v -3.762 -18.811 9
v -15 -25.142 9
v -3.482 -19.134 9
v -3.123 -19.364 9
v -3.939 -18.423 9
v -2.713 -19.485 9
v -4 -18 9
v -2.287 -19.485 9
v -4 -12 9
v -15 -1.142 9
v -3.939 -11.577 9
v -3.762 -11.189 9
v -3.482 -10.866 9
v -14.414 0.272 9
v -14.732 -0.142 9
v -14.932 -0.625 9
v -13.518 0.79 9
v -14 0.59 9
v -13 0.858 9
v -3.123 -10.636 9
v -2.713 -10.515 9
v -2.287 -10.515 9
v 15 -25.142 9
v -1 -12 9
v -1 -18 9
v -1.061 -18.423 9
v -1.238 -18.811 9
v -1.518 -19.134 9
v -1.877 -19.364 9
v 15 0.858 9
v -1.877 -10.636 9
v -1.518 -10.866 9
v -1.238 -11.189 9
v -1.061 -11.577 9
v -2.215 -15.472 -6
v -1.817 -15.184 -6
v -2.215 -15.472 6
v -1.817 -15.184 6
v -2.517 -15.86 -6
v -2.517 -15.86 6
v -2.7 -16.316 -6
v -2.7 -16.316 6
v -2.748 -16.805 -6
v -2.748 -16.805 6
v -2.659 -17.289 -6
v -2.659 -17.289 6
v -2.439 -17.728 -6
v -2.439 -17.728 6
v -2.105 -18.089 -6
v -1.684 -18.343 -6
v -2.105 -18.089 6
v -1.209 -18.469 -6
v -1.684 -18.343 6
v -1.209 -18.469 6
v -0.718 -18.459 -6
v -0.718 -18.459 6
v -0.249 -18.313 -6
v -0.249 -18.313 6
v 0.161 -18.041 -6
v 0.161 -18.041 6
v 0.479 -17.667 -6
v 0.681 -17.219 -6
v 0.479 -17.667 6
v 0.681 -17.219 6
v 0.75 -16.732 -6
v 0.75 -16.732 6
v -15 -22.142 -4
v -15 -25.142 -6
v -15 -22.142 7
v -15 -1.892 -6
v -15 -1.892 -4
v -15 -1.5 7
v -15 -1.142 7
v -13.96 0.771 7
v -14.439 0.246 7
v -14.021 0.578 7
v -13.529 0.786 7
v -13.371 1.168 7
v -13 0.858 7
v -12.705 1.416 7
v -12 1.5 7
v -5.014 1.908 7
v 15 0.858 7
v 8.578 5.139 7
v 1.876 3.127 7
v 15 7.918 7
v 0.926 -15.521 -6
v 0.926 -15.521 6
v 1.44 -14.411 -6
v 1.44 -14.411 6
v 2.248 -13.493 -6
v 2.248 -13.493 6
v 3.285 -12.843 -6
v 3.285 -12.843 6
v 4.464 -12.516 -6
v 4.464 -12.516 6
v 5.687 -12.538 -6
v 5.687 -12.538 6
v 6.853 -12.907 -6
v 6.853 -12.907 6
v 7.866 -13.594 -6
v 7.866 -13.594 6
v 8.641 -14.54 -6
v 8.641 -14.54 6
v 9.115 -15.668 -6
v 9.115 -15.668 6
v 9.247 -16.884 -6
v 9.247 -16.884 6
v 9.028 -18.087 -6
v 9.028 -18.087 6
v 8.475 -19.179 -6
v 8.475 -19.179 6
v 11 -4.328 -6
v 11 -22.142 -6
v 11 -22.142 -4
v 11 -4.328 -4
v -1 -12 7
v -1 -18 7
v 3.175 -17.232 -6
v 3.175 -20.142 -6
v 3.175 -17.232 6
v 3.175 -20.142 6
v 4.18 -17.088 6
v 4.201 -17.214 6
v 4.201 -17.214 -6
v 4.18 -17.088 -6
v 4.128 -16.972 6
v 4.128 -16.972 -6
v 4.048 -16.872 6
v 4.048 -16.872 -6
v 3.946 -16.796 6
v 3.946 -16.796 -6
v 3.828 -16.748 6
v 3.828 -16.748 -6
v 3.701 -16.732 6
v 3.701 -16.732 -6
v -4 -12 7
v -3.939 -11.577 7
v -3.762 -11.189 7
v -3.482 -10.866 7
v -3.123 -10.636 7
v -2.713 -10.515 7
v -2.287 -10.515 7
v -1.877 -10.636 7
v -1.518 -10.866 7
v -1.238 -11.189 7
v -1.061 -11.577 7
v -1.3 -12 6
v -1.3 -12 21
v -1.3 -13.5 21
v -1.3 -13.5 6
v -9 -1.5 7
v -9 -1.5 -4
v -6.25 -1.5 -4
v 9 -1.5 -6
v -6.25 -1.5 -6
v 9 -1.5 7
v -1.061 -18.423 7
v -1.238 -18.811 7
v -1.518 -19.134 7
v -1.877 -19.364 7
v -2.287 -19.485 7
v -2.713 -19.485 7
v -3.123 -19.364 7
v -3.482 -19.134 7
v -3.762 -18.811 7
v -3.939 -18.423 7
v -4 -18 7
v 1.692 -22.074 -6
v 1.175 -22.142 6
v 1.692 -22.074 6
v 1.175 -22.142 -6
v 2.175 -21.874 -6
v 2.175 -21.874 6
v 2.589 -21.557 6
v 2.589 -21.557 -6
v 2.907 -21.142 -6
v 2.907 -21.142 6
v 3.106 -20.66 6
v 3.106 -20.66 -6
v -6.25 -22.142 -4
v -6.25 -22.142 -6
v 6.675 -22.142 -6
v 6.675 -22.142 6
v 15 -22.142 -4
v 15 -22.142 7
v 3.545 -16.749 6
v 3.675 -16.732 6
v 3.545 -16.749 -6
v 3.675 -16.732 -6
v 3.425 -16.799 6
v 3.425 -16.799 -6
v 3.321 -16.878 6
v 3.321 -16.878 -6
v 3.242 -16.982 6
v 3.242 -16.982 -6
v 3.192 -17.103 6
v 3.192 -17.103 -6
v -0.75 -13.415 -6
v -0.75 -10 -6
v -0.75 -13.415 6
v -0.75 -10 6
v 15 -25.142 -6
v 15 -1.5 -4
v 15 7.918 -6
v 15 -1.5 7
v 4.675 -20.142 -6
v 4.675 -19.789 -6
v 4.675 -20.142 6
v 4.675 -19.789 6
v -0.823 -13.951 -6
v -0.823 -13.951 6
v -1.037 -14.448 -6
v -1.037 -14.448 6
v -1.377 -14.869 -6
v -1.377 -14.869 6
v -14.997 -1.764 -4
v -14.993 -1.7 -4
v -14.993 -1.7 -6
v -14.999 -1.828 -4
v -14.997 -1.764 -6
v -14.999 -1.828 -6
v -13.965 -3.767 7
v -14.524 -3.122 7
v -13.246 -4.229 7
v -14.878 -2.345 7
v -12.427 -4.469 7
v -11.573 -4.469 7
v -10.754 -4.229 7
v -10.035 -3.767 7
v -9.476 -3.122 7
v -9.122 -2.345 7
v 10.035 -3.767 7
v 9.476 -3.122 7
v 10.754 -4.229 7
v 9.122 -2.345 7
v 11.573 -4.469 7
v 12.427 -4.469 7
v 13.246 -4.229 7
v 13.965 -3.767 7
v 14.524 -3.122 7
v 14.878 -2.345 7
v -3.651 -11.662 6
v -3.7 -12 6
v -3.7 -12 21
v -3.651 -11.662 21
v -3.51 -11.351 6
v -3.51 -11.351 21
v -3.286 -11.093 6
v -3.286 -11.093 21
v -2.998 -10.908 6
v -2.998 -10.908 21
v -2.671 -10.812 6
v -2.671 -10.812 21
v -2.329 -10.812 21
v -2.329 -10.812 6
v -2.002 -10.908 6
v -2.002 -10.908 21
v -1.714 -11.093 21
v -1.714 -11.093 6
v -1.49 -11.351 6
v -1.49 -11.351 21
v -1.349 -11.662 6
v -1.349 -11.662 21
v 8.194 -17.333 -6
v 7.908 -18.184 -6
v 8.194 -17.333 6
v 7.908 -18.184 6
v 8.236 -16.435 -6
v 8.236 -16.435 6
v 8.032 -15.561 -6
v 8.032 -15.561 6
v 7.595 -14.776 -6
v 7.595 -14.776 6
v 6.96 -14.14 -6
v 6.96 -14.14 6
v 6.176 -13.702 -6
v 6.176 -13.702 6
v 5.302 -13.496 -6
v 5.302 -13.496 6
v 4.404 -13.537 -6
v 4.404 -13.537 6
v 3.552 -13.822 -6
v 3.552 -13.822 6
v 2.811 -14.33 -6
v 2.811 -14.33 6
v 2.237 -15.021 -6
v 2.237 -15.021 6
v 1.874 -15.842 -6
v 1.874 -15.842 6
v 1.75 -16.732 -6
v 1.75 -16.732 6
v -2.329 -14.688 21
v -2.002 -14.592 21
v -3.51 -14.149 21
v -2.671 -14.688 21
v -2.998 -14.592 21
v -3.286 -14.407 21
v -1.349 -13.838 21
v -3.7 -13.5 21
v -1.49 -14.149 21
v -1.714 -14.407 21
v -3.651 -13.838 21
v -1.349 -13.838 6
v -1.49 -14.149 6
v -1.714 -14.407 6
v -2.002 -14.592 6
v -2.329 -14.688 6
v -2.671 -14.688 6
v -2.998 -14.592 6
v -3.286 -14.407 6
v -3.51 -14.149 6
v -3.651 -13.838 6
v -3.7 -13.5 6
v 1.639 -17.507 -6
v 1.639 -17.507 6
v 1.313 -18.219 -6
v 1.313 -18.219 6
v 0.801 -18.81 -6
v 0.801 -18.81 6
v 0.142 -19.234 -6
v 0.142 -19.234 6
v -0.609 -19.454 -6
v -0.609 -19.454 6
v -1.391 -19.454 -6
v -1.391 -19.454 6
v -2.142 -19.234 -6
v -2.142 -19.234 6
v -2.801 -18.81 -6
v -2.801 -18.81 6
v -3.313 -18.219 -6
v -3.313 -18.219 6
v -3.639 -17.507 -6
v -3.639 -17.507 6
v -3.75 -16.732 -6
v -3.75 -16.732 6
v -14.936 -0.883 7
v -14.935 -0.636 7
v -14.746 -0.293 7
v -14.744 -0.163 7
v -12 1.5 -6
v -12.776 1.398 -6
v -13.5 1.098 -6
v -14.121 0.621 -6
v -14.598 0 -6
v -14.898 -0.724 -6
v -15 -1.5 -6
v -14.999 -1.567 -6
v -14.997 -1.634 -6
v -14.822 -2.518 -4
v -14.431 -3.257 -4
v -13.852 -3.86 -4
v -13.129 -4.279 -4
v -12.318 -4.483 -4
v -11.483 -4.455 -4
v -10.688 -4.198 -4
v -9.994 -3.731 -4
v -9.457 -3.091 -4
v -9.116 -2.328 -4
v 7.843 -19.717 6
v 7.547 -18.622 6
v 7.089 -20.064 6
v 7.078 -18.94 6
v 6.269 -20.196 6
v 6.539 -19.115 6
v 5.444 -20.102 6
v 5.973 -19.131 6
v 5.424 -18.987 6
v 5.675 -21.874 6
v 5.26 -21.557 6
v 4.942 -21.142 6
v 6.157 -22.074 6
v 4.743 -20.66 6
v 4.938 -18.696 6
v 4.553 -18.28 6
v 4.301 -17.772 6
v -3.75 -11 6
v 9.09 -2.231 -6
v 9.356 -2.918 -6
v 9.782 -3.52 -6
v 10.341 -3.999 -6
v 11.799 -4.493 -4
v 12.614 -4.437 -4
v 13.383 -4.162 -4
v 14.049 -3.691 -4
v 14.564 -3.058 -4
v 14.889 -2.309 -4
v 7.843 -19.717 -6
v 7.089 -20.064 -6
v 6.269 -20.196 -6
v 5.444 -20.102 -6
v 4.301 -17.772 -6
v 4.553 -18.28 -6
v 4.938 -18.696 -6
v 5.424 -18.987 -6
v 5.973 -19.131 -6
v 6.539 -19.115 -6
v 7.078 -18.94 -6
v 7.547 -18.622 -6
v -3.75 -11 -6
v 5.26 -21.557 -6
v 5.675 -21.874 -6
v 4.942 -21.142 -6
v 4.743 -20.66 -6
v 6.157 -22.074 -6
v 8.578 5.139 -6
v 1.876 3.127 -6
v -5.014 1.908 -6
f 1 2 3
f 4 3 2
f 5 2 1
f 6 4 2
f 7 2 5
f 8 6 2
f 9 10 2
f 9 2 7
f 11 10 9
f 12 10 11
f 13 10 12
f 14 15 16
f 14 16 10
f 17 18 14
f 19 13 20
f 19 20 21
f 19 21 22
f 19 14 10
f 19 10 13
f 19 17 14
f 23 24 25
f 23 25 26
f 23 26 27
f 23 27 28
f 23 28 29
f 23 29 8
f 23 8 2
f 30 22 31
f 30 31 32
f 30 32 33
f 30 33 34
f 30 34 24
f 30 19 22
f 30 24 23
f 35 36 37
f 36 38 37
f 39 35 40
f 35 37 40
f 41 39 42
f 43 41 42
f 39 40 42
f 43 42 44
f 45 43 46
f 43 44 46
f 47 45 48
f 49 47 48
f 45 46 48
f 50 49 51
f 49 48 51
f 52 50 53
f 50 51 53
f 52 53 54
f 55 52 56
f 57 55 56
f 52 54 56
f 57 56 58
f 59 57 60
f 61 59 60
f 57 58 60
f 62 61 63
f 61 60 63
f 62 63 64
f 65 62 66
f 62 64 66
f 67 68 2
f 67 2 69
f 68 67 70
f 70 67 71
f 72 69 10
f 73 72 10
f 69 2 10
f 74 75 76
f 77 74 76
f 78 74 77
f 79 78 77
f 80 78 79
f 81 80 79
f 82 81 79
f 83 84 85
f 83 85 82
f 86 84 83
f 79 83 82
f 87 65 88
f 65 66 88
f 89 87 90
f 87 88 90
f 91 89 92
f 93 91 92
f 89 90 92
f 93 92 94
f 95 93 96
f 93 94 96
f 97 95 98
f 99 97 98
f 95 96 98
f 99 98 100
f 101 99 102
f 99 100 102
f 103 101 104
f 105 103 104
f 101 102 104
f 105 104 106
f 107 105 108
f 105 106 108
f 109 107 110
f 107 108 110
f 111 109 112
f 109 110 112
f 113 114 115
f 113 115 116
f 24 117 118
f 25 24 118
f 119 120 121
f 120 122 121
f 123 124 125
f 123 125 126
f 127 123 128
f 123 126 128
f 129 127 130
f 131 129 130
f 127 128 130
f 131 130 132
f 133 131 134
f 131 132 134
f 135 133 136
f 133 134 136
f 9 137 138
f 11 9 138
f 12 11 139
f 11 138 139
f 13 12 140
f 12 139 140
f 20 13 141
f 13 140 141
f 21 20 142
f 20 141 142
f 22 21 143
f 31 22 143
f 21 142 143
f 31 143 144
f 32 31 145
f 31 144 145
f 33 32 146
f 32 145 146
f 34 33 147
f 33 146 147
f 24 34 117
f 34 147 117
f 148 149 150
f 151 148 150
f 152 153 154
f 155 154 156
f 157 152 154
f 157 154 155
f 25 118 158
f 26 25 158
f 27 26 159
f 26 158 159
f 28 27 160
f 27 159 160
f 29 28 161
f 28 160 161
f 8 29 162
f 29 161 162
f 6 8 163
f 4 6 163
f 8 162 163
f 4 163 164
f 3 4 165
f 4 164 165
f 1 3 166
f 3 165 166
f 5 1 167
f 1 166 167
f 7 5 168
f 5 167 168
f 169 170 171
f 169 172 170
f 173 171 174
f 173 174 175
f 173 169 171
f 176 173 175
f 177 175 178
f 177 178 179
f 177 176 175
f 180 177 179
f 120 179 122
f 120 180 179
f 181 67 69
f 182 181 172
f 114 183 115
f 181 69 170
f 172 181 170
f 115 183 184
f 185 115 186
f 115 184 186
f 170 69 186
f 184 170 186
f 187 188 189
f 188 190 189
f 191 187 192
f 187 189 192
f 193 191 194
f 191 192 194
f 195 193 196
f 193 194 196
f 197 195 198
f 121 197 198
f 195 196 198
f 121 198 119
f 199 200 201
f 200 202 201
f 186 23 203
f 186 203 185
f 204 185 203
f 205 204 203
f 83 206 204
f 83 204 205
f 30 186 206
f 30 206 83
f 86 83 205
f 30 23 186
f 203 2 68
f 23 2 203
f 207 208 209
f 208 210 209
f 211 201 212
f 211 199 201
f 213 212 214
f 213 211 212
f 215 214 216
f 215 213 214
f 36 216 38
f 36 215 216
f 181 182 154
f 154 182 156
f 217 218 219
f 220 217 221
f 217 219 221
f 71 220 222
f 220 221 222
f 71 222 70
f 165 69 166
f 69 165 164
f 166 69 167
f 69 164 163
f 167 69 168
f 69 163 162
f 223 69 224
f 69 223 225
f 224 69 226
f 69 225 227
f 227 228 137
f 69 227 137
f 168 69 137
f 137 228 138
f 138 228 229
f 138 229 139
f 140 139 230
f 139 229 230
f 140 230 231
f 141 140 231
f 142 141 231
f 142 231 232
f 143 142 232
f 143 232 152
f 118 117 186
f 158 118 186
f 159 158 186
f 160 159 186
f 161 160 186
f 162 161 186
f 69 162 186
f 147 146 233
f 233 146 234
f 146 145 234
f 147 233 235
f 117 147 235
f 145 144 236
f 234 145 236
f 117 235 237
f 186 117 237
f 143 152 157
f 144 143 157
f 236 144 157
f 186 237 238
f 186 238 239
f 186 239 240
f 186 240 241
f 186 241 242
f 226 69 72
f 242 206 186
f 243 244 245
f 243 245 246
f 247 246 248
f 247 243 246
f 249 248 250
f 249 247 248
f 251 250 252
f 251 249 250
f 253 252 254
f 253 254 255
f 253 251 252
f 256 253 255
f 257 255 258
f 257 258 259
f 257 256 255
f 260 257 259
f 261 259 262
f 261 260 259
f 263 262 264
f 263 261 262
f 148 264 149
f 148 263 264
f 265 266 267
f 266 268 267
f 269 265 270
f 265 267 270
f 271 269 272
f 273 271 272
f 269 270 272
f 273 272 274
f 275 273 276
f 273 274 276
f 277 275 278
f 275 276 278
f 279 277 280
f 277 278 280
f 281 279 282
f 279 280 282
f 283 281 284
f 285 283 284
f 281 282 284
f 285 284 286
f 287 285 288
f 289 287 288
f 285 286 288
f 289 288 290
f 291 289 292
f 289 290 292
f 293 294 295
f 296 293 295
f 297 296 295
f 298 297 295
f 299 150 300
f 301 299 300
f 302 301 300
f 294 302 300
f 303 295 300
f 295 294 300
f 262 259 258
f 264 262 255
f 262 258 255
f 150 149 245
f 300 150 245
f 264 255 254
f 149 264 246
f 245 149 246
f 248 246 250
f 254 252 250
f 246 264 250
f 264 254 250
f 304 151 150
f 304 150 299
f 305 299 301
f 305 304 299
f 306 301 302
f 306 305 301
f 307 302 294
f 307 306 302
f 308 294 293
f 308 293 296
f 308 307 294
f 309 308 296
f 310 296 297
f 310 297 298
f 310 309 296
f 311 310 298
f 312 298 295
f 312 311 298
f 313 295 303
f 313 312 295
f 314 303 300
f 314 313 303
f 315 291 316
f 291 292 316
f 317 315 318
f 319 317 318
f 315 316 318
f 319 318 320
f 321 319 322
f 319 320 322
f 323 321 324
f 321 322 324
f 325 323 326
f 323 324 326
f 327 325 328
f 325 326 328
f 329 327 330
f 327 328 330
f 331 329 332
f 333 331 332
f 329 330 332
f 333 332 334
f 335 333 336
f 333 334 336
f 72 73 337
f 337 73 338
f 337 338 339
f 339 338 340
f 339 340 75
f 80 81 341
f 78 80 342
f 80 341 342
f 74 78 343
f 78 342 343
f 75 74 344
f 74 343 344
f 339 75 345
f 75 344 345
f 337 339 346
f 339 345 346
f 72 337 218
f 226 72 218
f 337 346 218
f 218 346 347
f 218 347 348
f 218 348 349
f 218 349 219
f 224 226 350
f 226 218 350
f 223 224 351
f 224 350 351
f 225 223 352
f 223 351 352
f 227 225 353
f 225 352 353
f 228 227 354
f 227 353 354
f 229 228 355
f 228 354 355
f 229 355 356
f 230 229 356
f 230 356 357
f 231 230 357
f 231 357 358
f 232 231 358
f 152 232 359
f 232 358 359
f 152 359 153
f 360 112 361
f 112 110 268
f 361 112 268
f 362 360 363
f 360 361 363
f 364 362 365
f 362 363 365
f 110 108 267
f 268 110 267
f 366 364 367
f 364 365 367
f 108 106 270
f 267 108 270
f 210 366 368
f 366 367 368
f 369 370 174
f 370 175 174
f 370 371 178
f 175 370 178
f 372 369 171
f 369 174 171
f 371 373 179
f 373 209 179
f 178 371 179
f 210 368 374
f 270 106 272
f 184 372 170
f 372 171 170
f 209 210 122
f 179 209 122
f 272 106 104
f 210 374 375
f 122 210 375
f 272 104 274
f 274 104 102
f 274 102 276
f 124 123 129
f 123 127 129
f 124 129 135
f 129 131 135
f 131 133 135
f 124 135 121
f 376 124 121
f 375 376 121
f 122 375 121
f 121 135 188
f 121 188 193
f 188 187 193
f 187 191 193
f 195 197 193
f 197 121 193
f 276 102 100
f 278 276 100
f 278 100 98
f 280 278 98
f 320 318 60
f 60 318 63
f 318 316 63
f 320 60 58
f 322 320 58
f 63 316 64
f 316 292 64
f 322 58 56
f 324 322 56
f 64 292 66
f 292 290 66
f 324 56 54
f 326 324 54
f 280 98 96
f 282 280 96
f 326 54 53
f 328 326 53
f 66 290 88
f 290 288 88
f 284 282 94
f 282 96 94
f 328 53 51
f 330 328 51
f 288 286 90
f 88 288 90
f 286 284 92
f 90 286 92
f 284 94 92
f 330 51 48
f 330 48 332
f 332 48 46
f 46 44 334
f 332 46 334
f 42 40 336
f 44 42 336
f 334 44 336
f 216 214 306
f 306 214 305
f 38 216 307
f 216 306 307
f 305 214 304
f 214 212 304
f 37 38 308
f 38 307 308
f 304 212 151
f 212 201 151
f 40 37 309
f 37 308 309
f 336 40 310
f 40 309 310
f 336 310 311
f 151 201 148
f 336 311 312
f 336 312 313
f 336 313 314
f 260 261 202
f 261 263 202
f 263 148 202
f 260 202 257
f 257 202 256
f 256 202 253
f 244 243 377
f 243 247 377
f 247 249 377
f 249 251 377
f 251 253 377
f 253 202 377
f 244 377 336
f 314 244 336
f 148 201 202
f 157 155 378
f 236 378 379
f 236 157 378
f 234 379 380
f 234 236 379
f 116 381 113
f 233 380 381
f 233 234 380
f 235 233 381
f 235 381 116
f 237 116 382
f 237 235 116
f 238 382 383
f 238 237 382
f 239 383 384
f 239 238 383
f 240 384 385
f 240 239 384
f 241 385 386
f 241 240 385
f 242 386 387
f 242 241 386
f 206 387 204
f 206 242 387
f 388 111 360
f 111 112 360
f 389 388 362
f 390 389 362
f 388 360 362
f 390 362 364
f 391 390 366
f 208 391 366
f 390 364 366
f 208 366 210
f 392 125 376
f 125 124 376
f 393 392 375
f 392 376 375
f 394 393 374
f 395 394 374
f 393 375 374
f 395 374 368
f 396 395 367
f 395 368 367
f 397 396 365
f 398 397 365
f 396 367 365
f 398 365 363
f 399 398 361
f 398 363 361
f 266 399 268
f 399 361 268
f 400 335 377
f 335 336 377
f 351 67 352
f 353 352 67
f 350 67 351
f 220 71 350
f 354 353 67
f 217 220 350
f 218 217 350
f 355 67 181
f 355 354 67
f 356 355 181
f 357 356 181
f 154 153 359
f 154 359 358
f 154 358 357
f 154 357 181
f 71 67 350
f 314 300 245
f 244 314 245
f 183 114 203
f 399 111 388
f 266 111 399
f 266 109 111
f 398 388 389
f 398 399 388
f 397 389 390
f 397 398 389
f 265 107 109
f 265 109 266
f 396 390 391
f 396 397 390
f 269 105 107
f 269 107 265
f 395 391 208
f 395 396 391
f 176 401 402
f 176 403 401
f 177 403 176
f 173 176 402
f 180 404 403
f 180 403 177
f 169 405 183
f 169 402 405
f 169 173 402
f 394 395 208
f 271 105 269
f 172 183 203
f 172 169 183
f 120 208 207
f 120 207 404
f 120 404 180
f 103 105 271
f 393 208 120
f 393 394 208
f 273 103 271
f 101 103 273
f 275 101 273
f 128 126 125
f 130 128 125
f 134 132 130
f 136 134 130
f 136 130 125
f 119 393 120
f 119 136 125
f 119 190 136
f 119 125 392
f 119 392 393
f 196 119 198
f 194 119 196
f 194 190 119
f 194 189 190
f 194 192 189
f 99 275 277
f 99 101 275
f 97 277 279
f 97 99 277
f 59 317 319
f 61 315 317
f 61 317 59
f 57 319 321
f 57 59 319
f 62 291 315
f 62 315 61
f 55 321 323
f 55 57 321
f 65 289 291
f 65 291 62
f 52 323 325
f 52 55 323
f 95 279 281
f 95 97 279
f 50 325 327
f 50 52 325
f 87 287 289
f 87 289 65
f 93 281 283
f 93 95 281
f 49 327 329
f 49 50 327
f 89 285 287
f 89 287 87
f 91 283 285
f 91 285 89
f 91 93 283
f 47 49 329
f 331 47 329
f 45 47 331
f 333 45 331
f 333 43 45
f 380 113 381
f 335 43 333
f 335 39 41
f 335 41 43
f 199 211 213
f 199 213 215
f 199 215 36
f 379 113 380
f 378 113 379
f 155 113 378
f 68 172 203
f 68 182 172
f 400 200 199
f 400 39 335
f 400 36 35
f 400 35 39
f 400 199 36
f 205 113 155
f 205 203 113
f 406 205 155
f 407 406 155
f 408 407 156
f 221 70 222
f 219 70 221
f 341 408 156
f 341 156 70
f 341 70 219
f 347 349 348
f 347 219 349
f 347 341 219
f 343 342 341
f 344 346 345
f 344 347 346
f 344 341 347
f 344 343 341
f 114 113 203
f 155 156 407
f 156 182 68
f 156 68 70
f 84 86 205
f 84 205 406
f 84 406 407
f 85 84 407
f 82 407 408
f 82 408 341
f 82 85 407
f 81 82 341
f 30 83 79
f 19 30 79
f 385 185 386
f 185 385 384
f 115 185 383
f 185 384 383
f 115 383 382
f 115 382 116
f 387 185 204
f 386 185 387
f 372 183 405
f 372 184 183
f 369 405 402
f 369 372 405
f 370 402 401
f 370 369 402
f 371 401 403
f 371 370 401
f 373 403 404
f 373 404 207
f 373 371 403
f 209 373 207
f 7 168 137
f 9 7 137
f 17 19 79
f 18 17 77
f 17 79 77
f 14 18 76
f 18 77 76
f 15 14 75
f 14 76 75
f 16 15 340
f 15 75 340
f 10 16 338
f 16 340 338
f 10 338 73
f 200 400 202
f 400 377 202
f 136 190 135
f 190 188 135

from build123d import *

# Parameters (mm, degrees)
RESSALTO_EXTRUS_O1_DEPTH   = 6
RESSALTO_EXTRUS_O1_2_DEPTH = 6
RESSALTO_EXTRUS_O2_START   = 1
RESSALTO_EXTRUS_O2_DEPTH   = 2
RESSALTO_EXTRUS_O4_START   = 1
ESBO_O3_W                  = 30
ESBO_O3_H                  = 3
RESSALTO_EXTRUS_O4_DEPTH   = 1
ESBO_O5_W                  = 4
ESBO_O5_H                  = 26
RESSALTO_EXTRUS_O6_DEPTH   = 2
RESSALTO_EXTRUS_O7_DEPTH   = 15
FILETE7_R                  = 2
FILETE8_R                  = 0.5
FILETE9_R                  = 2


with BuildPart() as part:
    # Esboço1 → Ressalto-extrusão1 (new, symmetric)
    with BuildSketch(Plane.XY):
        with BuildLine():
            Line((-9, -1.5), (9, -1.5))
            ThreePointArc((9, -1.5), (12, -4.5), (15, -1.5))
            Line((15, -1.5), (15, 1.5))
            Line((15, 1.5), (15, 7.918286702))
            ThreePointArc((15, 7.918286702), (1.876188275, 3.126620802), (-12, 1.5))
            ThreePointArc((-12, 1.5), (-14.121320344, 0.621320344), (-15, -1.5))
            ThreePointArc((-15, -1.5), (-12, -4.5), (-9, -1.5))
        make_face()
    extrude(amount=RESSALTO_EXTRUS_O1_DEPTH, both=True)



with BuildPart() as body_2:
    # Esboço1 → Ressalto-extrus_o1 2 (new, symmetric)
    with BuildSketch(Plane.XY):
        with BuildLine():
            Line((15, -25.142315596), (-15, -25.142315596))
            Line((-15, -25.142315596), (-15, -22.142315596))
            Line((-15, -22.142315596), (-3.5, -22.142315596))
            Line((-3.5, -22.142315596), (3.174548445, -22.142315596))
            Line((3.174548445, -22.142315596), (3.174548445, -16.732050808))
            Line((3.174548445, -16.732050808), (4.242268465, -16.732050808))
            ThreePointArc((4.242268465, -16.732050808), (5.462746803, -19.00323777), (7.90754076, -18.184189481))
            ThreePointArc((7.90754076, -18.184189481), (5.745986772, -13.568824016), (1.75, -16.732050808))
            ThreePointArc((1.75, -16.732050808), (-1, -19.482050808), (-3.75, -16.732050808))
            Line((-3.75, -16.732050808), (-3.75, -11))
            Line((-3.75, -11), (-0.75, -10))
            Line((-0.75, -10), (-0.75, -11))
            Line((-0.75, -11), (-0.75, -15))
            ThreePointArc((-0.75, -15), (-2.322875656, -17.877694731), (0.75, -16.732050808))
            ThreePointArc((0.75, -16.732050808), (6.283199983, -12.680397095), (8.475128378, -19.17867762))
            ThreePointArc((8.475128378, -19.17867762), (6.683061453, -20.158063602), (4.674548445, -19.788501348))
            Line((4.674548445, -19.788501348), (4.674548445, -22.142315596))
            Line((4.674548445, -22.142315596), (15, -22.142315596))
            Line((15, -22.142315596), (15, -25.142315596))
        make_face()
    extrude(amount=RESSALTO_EXTRUS_O1_2_DEPTH, both=True)


with BuildPart() as body_3:
    # Esboço2 → Ressalto-extrusão2 (new body)
    with BuildSketch(Plane.XY.offset(6).offset(RESSALTO_EXTRUS_O2_START)):
        with BuildLine():
            Line((-15, -25.142315596), (15, -25.142315596))
            Line((15, -25.142315596), (15, 0.857684404))
            Line((15, 0.857684404), (-13, 0.857684404))
            ThreePointArc((-13, 0.857684404), (-14.414213562, 0.271897966), (-15, -1.142315596))
            Line((-15, -1.142315596), (-15, -25.142315596))
        make_face()
        with BuildLine():
            Line((-1, -12), (-1, -18))
            ThreePointArc((-1, -18), (-2.5, -19.5), (-4, -18))
            Line((-4, -18), (-4, -12))
            ThreePointArc((-4, -12), (-2.5, -10.5), (-1, -12))
        make_face(mode=Mode.SUBTRACT)
    extrude(amount=RESSALTO_EXTRUS_O2_DEPTH)


with BuildPart() as part_1:
    add(part.part)

    add(body_2.part)  # Ressalto-extrusão4 merges body 2

    add(body_3.part)  # Ressalto-extrusão4 merges body 3
    # Esboço3 → Ressalto-extrusão4 (add)
    with BuildSketch(Plane.XY.offset(6).offset(RESSALTO_EXTRUS_O4_START)):
        with Locations((0, -23.642315596)):
            Rectangle(ESBO_O3_W, ESBO_O3_H)
        with BuildLine():
            Line((15, -1.5), (15, 7.918286702))
            ThreePointArc((15, 7.918286702), (1.876188275, 3.126620802), (-12, 1.5))
            ThreePointArc((-12, 1.5), (-14.121320344, -3.621320344), (-9, -1.5))
            Line((-9, -1.5), (9, -1.5))
            ThreePointArc((9, -1.5), (12, -4.5), (15, -1.5))
        make_face()
    extrude(amount=-RESSALTO_EXTRUS_O4_DEPTH)

    # Esboço5 → Ressalto-extrusão6 (add)
    with BuildSketch(Plane(origin=(0, 0, -6), x_dir=(-1, 0, 0), z_dir=(0, 0, -1))):
        with Locations((-13, -12.142315596)):
            Rectangle(ESBO_O5_W, ESBO_O5_H)
        with BuildLine():
            Line((6.25, -25.142315596), (6.25, 0.857684404))
            Line((6.25, 0.857684404), (12.25, 0.857684404))
            ThreePointArc((12.25, 0.857684404), (14.194543648, 0.052228052), (15, -1.892315596))
            Line((15, -1.892315596), (15, -25.142315596))
            Line((15, -25.142315596), (6.25, -25.142315596))
        make_face()
    extrude(amount=-RESSALTO_EXTRUS_O6_DEPTH)

    # Esboço4 → Ressalto-extrusão7 (add)
    with BuildSketch(Plane.XY.offset(6)):
        with BuildLine():
            Line((-1.3, -12), (-1.3, -13.5))
            ThreePointArc((-1.3, -13.5), (-2.5, -14.7), (-3.7, -13.5))
            Line((-3.7, -13.5), (-3.7, -12))
            ThreePointArc((-3.7, -12), (-2.5, -10.8), (-1.3, -12))
        make_face()
    extrude(amount=RESSALTO_EXTRUS_O7_DEPTH)

    # Filete7
    filete7_edges = [part_1.edges().sort_by_distance(p)[0] for p in [
        (4.674548445, -22.142315596, 0),
        (3.174548445, -22.142315596, 0),
    ]]
    fillet(filete7_edges, radius=FILETE7_R)

    # Filete8
    filete8_edges = [part_1.edges().sort_by_distance(p)[0] for p in [
        (4.242268465, -16.732050808, 0),
        (3.174548445, -16.732050808, 0),
    ]]
    fillet(filete8_edges, radius=FILETE8_R)

    # Filete9
    filete9_edges = [part_1.edges().sort_by_distance(p)[0] for p in [
        (-0.75, -15, 0),
    ]]
    fillet(filete9_edges, radius=FILETE9_R)


solid = part_1.part
